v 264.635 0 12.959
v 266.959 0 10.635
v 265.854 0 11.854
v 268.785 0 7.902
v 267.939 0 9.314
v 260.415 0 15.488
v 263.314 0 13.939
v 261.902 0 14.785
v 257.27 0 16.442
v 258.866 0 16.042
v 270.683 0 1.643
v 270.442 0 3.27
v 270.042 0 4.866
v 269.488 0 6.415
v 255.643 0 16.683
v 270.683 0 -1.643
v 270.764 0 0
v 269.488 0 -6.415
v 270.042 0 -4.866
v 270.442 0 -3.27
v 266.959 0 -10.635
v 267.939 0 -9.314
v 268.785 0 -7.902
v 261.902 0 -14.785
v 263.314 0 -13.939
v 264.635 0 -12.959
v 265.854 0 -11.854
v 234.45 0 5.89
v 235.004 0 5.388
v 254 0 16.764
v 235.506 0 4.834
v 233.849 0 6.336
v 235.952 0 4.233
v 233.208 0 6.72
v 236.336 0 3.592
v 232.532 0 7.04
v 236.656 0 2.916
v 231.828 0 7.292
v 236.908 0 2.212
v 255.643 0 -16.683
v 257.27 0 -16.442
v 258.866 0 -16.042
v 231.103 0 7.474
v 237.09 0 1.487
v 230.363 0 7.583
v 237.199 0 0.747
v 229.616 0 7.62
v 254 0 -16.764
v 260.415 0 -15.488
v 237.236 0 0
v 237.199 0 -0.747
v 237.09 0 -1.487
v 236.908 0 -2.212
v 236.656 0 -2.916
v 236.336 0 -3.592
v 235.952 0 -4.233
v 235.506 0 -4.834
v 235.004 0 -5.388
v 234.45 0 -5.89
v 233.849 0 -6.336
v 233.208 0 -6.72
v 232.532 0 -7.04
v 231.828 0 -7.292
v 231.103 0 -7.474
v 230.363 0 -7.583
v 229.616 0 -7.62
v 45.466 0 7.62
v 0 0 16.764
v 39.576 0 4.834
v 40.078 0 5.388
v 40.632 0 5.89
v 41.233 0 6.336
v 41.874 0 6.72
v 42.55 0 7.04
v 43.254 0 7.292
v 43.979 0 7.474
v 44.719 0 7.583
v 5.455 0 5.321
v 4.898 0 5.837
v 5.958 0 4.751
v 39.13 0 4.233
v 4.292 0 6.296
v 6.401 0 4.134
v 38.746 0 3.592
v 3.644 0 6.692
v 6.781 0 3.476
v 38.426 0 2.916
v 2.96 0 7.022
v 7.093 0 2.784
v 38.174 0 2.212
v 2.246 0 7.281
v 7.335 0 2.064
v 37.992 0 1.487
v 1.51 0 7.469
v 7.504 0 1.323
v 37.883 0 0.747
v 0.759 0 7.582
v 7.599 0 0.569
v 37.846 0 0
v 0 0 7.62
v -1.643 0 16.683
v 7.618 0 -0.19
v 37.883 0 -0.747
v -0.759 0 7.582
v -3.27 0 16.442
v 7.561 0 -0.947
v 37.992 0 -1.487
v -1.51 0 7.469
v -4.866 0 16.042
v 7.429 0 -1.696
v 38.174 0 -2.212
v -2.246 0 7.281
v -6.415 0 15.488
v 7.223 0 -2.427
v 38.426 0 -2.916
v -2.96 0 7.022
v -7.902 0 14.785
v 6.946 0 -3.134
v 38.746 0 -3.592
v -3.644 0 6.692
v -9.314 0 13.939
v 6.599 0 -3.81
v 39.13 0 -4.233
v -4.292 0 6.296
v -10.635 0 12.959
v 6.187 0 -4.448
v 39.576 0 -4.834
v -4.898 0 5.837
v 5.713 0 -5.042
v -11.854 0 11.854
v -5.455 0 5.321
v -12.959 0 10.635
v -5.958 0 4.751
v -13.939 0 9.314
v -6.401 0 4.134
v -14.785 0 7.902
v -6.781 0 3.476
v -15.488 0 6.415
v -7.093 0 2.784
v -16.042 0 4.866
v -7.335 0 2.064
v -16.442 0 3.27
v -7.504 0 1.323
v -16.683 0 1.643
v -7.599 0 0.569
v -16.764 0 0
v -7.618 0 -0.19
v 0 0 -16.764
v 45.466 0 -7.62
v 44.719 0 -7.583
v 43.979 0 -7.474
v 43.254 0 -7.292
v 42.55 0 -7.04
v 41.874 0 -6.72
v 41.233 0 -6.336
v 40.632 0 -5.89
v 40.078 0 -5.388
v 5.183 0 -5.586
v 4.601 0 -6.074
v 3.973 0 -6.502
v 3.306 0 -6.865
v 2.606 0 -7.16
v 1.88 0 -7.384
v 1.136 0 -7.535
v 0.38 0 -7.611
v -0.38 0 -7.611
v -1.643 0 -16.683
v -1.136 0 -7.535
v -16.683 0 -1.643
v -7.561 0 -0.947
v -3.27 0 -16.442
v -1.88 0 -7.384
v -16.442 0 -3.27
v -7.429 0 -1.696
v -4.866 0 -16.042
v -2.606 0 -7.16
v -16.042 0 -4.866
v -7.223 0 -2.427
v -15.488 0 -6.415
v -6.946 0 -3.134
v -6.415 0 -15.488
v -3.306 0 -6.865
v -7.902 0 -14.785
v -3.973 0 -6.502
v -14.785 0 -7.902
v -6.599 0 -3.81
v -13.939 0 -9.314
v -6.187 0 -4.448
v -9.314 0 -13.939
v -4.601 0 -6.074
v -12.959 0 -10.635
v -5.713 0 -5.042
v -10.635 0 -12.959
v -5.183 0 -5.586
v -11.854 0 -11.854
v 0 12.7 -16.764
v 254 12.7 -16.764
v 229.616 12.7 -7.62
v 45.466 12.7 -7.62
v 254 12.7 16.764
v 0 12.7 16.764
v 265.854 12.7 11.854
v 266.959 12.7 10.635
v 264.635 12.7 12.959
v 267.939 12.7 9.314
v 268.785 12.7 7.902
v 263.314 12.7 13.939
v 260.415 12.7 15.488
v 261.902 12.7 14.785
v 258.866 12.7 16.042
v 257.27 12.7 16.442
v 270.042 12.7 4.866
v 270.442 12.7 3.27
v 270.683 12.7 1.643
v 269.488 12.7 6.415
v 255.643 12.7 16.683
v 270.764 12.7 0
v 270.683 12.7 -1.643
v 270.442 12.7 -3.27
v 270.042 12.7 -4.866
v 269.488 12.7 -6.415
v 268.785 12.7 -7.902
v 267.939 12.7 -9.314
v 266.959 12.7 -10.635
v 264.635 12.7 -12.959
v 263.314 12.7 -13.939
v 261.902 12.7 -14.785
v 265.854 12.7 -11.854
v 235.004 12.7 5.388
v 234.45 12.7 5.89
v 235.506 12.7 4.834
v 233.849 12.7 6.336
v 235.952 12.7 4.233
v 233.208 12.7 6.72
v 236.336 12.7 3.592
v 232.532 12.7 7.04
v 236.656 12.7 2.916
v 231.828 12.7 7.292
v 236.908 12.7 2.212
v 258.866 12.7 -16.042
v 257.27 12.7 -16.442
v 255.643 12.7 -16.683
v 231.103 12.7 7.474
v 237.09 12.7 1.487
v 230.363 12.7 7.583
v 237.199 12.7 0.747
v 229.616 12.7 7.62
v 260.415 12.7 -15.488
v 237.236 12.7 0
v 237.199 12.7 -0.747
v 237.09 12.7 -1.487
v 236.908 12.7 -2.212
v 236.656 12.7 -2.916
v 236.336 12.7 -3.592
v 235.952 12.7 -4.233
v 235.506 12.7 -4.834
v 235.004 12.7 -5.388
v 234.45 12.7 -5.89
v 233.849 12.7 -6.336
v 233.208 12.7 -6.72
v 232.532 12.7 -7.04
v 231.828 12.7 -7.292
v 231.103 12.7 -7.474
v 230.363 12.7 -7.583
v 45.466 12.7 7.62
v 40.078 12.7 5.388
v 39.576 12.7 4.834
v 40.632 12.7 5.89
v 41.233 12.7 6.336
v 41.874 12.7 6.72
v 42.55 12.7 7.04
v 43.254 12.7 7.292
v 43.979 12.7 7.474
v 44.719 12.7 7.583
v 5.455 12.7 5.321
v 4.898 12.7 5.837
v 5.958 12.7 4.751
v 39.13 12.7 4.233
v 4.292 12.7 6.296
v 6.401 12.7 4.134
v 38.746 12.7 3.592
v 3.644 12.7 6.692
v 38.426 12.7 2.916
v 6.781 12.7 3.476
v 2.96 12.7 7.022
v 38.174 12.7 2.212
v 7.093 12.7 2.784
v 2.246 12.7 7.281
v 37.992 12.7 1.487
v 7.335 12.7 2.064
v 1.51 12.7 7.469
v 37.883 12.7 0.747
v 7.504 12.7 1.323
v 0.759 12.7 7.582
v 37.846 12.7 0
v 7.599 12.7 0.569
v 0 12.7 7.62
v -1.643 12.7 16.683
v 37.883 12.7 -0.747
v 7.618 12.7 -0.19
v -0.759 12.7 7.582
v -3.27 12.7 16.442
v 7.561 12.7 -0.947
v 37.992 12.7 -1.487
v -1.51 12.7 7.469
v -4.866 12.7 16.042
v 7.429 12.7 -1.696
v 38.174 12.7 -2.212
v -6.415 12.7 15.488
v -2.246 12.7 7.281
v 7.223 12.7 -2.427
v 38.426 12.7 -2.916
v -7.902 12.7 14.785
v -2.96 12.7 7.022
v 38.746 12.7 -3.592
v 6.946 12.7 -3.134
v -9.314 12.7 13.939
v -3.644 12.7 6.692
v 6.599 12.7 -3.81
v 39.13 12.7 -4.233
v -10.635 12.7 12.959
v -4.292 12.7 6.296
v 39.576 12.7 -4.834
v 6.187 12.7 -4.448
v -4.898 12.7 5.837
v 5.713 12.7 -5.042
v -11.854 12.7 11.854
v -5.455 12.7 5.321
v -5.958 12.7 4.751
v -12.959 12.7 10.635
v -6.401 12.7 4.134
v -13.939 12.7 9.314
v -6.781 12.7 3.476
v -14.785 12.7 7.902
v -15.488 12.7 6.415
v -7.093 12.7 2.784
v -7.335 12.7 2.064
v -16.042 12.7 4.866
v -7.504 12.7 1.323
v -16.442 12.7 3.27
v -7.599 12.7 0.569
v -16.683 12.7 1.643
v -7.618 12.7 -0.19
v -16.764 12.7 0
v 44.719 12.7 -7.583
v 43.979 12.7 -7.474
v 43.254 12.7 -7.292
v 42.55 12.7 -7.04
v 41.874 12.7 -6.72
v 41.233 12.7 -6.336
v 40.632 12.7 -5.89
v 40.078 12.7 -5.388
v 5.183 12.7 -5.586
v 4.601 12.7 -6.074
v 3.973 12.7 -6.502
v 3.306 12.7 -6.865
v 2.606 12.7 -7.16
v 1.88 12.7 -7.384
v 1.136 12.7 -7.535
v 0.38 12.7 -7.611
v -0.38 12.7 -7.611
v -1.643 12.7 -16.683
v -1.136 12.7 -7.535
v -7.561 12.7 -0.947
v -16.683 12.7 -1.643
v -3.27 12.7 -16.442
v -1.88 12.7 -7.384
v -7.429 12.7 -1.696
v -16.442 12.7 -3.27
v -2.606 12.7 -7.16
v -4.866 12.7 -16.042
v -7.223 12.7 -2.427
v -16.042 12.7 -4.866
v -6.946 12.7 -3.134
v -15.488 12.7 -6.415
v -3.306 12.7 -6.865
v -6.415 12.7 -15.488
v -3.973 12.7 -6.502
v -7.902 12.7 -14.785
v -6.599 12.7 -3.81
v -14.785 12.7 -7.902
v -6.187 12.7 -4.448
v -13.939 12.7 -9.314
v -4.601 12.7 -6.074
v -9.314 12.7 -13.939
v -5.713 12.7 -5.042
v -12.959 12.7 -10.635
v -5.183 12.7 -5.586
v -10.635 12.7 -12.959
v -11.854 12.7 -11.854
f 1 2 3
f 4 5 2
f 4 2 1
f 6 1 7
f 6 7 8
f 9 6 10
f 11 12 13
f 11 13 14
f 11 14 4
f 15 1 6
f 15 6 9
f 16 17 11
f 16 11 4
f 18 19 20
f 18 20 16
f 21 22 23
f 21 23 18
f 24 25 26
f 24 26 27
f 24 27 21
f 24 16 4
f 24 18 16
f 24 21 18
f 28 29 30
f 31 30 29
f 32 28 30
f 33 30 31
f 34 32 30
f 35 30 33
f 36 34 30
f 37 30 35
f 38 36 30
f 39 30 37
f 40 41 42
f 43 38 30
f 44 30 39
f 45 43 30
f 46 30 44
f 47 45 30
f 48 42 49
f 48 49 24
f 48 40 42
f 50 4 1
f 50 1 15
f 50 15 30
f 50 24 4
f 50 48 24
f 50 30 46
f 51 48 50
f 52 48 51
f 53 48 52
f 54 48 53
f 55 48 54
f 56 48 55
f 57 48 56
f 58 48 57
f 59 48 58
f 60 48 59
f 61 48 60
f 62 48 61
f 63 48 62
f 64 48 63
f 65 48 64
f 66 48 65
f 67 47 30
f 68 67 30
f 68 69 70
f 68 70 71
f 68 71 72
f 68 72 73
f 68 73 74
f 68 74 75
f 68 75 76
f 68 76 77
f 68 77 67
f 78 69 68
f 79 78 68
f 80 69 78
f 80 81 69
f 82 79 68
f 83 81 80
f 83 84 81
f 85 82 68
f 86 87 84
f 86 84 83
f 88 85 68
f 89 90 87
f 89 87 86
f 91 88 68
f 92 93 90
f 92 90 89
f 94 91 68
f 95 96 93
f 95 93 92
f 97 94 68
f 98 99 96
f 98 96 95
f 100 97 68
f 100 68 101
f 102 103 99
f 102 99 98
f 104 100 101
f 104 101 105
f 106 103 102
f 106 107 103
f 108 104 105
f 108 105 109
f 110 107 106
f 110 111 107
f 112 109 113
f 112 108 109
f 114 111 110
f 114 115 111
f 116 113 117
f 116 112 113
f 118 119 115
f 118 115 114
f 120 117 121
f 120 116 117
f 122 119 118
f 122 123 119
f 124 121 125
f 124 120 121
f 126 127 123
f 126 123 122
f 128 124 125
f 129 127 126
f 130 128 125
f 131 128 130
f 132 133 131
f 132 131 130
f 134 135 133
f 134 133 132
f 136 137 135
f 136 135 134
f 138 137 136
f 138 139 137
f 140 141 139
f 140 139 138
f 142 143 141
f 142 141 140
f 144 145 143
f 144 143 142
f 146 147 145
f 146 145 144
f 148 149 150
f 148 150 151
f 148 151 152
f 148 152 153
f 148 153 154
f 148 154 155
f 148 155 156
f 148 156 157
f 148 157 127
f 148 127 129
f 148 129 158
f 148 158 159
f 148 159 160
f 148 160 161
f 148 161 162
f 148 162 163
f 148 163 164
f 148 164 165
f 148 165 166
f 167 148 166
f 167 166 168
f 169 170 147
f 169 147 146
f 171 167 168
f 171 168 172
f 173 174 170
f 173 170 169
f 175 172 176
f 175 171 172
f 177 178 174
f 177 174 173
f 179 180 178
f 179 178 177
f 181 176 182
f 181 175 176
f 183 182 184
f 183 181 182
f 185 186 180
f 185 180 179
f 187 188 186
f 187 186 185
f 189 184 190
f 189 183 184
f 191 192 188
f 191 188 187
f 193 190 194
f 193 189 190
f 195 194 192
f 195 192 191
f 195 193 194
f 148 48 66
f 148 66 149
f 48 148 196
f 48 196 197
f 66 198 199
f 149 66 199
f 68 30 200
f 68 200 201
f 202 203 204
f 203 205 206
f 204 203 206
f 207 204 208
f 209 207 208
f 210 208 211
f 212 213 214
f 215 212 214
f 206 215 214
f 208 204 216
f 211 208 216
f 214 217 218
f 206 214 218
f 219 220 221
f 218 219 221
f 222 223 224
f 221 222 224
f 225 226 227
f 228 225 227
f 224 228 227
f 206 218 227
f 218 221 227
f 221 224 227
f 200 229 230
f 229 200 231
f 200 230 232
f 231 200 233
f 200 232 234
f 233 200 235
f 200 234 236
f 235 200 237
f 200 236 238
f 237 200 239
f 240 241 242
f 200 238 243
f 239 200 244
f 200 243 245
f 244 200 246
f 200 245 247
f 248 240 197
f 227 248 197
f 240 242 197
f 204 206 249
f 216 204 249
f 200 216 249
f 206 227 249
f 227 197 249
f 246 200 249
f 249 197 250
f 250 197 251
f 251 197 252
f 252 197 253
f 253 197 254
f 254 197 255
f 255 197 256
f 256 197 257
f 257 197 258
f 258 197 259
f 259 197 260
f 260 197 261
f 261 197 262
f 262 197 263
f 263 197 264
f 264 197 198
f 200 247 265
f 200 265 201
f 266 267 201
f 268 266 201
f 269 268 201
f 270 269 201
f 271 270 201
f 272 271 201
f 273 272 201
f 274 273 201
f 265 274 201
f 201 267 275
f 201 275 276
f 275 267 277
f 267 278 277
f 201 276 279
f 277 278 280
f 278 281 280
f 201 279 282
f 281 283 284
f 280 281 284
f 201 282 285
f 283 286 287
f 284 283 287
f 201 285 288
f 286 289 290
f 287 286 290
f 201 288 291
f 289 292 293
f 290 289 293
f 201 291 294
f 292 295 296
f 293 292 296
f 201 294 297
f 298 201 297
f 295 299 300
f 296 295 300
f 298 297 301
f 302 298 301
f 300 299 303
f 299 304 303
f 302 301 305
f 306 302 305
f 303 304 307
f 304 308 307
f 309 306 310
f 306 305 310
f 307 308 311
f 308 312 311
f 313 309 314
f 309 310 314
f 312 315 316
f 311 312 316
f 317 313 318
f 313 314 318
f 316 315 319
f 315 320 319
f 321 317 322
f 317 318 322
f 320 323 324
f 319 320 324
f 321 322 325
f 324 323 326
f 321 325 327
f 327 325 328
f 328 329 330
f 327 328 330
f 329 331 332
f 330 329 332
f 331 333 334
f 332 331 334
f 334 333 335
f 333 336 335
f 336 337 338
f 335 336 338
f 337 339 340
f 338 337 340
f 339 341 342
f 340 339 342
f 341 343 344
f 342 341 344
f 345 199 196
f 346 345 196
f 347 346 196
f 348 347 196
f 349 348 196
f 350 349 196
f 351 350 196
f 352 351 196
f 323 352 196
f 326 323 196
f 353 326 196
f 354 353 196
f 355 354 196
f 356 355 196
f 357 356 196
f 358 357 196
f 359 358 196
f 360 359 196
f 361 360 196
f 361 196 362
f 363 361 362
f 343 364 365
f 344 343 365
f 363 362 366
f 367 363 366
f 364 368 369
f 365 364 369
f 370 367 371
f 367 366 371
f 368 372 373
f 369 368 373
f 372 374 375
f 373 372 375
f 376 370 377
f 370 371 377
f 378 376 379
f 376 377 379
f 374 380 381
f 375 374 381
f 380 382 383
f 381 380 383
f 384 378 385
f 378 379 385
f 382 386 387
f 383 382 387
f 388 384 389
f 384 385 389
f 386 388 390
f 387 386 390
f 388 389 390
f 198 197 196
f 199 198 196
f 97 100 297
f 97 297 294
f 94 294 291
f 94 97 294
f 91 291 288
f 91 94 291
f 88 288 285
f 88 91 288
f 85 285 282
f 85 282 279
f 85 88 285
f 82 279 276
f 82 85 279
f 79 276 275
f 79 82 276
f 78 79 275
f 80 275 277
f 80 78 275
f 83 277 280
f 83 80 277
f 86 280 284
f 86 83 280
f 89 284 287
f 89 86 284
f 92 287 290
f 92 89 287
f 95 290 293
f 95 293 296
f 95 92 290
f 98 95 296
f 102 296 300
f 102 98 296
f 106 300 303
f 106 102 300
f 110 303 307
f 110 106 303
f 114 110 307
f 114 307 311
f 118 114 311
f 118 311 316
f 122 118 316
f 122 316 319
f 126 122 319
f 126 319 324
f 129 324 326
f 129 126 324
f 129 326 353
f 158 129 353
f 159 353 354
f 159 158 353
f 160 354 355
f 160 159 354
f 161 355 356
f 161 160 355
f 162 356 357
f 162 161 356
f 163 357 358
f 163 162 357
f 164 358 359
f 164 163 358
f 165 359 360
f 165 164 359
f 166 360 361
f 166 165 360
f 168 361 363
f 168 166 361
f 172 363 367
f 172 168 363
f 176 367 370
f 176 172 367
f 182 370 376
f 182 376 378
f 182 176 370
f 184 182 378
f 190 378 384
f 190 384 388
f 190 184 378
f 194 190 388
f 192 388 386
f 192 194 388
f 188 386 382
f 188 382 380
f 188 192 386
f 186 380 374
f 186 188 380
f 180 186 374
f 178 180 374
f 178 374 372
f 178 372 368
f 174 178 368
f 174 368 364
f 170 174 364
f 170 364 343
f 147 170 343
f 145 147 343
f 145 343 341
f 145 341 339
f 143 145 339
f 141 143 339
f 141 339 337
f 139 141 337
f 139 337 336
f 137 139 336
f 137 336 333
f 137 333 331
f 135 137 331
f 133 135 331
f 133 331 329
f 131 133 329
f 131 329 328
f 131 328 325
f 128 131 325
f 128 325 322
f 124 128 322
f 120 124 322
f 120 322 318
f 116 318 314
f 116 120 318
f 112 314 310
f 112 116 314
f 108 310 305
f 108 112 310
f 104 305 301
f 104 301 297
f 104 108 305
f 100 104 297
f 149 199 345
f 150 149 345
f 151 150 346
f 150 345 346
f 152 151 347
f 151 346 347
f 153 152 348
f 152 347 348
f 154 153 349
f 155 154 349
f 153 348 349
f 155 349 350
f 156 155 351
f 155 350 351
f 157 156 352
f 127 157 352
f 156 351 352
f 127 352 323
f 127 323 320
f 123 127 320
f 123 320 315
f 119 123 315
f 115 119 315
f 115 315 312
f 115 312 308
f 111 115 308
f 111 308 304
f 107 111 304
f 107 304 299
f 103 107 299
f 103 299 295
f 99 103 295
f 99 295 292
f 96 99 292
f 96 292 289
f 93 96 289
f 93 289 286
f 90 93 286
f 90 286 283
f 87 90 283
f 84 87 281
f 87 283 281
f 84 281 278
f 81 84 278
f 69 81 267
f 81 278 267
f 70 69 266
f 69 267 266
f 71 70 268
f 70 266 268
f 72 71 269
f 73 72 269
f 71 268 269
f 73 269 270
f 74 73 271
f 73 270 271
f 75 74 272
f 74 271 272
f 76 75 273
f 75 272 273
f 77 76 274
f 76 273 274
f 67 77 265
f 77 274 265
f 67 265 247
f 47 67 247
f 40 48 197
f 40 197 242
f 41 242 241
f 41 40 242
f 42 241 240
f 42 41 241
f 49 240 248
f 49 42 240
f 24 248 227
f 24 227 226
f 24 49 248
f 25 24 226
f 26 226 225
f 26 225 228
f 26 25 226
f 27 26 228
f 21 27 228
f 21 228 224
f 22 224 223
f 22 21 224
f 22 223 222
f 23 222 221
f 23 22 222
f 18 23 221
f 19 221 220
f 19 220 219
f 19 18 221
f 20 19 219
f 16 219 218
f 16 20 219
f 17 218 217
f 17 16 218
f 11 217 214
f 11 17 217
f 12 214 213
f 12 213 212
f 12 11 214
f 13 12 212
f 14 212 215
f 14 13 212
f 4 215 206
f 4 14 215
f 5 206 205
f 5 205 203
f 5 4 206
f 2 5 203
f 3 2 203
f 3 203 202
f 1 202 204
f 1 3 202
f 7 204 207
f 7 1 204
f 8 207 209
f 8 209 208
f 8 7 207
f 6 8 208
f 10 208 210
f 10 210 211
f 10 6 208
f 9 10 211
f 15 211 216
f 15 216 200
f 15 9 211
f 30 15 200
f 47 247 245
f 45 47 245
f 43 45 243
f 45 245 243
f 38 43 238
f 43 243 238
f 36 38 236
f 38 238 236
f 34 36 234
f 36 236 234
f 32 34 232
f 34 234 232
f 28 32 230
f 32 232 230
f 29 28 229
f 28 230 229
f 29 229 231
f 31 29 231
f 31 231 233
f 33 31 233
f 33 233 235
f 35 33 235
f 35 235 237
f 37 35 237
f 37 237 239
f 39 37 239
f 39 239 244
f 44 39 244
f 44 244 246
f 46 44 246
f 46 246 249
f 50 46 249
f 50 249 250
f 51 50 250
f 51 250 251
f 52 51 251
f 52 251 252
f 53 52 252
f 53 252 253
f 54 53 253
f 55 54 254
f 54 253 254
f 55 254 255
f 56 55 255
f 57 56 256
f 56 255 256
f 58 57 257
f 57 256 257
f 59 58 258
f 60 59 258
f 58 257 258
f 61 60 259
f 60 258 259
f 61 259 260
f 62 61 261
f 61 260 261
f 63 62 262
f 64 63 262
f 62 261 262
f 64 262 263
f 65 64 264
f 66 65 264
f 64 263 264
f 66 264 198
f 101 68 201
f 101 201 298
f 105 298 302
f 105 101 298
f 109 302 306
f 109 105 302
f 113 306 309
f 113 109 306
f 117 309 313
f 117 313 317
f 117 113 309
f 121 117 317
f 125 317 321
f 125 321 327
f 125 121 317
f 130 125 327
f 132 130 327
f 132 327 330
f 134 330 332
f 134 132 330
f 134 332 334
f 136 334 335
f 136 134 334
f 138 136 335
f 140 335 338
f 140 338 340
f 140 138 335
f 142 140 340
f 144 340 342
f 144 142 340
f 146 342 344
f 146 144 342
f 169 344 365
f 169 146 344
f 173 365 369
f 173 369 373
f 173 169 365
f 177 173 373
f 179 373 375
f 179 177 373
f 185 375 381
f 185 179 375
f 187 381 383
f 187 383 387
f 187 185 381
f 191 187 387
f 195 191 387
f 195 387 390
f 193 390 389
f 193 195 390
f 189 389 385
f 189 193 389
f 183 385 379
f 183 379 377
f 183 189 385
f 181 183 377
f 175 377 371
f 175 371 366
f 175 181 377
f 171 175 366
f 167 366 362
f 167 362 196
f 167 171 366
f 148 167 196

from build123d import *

# Parameters (mm, degrees)
SKETCH1_R           = 7.62
BOSS_EXTRUDE1_DEPTH = 12.7
CUT_EXTRUDE1_DEPTH  = 45.974


with BuildPart() as part:
    # Sketch1 → Boss-Extrude1 (new body)
    with BuildSketch(Plane(origin=(0, 0, 0), x_dir=(1, 0, 0), z_dir=(0, 1, 0))):
        with BuildLine():
            Line((0, 16.764), (254, 16.764))
            ThreePointArc((254, 16.764), (270.764, 0), (254, -16.764))
            Line((254, -16.764), (0, -16.764))
            ThreePointArc((0, -16.764), (-16.764, 0), (0, 16.764))
        make_face()
        with Locations(Location((0, 0, 0), (0, 0, 270))):
            Circle(SKETCH1_R, mode=Mode.SUBTRACT)
    extrude(amount=BOSS_EXTRUDE1_DEPTH)

    # Sketch3 → Cut-Extrude1 (cut)
    with BuildSketch(Plane(origin=(0, 12.7, 0), x_dir=(1, 0, 0), z_dir=(0, 1, 0))):
        with BuildLine():
            ThreePointArc((45.466, 7.62), (37.846, 0), (45.466, -7.62))
            Line((45.466, -7.62), (102.616, -7.62))
            Line((102.616, -7.62), (229.616, -7.62))
            ThreePointArc((229.616, -7.62), (237.236, 0), (229.616, 7.62))
            Line((229.616, 7.62), (167.898503034, 7.62))
            Line((167.898503034, 7.62), (45.466, 7.62))
        make_face()
    extrude(amount=-CUT_EXTRUDE1_DEPTH, mode=Mode.SUBTRACT)


solid = part.part
